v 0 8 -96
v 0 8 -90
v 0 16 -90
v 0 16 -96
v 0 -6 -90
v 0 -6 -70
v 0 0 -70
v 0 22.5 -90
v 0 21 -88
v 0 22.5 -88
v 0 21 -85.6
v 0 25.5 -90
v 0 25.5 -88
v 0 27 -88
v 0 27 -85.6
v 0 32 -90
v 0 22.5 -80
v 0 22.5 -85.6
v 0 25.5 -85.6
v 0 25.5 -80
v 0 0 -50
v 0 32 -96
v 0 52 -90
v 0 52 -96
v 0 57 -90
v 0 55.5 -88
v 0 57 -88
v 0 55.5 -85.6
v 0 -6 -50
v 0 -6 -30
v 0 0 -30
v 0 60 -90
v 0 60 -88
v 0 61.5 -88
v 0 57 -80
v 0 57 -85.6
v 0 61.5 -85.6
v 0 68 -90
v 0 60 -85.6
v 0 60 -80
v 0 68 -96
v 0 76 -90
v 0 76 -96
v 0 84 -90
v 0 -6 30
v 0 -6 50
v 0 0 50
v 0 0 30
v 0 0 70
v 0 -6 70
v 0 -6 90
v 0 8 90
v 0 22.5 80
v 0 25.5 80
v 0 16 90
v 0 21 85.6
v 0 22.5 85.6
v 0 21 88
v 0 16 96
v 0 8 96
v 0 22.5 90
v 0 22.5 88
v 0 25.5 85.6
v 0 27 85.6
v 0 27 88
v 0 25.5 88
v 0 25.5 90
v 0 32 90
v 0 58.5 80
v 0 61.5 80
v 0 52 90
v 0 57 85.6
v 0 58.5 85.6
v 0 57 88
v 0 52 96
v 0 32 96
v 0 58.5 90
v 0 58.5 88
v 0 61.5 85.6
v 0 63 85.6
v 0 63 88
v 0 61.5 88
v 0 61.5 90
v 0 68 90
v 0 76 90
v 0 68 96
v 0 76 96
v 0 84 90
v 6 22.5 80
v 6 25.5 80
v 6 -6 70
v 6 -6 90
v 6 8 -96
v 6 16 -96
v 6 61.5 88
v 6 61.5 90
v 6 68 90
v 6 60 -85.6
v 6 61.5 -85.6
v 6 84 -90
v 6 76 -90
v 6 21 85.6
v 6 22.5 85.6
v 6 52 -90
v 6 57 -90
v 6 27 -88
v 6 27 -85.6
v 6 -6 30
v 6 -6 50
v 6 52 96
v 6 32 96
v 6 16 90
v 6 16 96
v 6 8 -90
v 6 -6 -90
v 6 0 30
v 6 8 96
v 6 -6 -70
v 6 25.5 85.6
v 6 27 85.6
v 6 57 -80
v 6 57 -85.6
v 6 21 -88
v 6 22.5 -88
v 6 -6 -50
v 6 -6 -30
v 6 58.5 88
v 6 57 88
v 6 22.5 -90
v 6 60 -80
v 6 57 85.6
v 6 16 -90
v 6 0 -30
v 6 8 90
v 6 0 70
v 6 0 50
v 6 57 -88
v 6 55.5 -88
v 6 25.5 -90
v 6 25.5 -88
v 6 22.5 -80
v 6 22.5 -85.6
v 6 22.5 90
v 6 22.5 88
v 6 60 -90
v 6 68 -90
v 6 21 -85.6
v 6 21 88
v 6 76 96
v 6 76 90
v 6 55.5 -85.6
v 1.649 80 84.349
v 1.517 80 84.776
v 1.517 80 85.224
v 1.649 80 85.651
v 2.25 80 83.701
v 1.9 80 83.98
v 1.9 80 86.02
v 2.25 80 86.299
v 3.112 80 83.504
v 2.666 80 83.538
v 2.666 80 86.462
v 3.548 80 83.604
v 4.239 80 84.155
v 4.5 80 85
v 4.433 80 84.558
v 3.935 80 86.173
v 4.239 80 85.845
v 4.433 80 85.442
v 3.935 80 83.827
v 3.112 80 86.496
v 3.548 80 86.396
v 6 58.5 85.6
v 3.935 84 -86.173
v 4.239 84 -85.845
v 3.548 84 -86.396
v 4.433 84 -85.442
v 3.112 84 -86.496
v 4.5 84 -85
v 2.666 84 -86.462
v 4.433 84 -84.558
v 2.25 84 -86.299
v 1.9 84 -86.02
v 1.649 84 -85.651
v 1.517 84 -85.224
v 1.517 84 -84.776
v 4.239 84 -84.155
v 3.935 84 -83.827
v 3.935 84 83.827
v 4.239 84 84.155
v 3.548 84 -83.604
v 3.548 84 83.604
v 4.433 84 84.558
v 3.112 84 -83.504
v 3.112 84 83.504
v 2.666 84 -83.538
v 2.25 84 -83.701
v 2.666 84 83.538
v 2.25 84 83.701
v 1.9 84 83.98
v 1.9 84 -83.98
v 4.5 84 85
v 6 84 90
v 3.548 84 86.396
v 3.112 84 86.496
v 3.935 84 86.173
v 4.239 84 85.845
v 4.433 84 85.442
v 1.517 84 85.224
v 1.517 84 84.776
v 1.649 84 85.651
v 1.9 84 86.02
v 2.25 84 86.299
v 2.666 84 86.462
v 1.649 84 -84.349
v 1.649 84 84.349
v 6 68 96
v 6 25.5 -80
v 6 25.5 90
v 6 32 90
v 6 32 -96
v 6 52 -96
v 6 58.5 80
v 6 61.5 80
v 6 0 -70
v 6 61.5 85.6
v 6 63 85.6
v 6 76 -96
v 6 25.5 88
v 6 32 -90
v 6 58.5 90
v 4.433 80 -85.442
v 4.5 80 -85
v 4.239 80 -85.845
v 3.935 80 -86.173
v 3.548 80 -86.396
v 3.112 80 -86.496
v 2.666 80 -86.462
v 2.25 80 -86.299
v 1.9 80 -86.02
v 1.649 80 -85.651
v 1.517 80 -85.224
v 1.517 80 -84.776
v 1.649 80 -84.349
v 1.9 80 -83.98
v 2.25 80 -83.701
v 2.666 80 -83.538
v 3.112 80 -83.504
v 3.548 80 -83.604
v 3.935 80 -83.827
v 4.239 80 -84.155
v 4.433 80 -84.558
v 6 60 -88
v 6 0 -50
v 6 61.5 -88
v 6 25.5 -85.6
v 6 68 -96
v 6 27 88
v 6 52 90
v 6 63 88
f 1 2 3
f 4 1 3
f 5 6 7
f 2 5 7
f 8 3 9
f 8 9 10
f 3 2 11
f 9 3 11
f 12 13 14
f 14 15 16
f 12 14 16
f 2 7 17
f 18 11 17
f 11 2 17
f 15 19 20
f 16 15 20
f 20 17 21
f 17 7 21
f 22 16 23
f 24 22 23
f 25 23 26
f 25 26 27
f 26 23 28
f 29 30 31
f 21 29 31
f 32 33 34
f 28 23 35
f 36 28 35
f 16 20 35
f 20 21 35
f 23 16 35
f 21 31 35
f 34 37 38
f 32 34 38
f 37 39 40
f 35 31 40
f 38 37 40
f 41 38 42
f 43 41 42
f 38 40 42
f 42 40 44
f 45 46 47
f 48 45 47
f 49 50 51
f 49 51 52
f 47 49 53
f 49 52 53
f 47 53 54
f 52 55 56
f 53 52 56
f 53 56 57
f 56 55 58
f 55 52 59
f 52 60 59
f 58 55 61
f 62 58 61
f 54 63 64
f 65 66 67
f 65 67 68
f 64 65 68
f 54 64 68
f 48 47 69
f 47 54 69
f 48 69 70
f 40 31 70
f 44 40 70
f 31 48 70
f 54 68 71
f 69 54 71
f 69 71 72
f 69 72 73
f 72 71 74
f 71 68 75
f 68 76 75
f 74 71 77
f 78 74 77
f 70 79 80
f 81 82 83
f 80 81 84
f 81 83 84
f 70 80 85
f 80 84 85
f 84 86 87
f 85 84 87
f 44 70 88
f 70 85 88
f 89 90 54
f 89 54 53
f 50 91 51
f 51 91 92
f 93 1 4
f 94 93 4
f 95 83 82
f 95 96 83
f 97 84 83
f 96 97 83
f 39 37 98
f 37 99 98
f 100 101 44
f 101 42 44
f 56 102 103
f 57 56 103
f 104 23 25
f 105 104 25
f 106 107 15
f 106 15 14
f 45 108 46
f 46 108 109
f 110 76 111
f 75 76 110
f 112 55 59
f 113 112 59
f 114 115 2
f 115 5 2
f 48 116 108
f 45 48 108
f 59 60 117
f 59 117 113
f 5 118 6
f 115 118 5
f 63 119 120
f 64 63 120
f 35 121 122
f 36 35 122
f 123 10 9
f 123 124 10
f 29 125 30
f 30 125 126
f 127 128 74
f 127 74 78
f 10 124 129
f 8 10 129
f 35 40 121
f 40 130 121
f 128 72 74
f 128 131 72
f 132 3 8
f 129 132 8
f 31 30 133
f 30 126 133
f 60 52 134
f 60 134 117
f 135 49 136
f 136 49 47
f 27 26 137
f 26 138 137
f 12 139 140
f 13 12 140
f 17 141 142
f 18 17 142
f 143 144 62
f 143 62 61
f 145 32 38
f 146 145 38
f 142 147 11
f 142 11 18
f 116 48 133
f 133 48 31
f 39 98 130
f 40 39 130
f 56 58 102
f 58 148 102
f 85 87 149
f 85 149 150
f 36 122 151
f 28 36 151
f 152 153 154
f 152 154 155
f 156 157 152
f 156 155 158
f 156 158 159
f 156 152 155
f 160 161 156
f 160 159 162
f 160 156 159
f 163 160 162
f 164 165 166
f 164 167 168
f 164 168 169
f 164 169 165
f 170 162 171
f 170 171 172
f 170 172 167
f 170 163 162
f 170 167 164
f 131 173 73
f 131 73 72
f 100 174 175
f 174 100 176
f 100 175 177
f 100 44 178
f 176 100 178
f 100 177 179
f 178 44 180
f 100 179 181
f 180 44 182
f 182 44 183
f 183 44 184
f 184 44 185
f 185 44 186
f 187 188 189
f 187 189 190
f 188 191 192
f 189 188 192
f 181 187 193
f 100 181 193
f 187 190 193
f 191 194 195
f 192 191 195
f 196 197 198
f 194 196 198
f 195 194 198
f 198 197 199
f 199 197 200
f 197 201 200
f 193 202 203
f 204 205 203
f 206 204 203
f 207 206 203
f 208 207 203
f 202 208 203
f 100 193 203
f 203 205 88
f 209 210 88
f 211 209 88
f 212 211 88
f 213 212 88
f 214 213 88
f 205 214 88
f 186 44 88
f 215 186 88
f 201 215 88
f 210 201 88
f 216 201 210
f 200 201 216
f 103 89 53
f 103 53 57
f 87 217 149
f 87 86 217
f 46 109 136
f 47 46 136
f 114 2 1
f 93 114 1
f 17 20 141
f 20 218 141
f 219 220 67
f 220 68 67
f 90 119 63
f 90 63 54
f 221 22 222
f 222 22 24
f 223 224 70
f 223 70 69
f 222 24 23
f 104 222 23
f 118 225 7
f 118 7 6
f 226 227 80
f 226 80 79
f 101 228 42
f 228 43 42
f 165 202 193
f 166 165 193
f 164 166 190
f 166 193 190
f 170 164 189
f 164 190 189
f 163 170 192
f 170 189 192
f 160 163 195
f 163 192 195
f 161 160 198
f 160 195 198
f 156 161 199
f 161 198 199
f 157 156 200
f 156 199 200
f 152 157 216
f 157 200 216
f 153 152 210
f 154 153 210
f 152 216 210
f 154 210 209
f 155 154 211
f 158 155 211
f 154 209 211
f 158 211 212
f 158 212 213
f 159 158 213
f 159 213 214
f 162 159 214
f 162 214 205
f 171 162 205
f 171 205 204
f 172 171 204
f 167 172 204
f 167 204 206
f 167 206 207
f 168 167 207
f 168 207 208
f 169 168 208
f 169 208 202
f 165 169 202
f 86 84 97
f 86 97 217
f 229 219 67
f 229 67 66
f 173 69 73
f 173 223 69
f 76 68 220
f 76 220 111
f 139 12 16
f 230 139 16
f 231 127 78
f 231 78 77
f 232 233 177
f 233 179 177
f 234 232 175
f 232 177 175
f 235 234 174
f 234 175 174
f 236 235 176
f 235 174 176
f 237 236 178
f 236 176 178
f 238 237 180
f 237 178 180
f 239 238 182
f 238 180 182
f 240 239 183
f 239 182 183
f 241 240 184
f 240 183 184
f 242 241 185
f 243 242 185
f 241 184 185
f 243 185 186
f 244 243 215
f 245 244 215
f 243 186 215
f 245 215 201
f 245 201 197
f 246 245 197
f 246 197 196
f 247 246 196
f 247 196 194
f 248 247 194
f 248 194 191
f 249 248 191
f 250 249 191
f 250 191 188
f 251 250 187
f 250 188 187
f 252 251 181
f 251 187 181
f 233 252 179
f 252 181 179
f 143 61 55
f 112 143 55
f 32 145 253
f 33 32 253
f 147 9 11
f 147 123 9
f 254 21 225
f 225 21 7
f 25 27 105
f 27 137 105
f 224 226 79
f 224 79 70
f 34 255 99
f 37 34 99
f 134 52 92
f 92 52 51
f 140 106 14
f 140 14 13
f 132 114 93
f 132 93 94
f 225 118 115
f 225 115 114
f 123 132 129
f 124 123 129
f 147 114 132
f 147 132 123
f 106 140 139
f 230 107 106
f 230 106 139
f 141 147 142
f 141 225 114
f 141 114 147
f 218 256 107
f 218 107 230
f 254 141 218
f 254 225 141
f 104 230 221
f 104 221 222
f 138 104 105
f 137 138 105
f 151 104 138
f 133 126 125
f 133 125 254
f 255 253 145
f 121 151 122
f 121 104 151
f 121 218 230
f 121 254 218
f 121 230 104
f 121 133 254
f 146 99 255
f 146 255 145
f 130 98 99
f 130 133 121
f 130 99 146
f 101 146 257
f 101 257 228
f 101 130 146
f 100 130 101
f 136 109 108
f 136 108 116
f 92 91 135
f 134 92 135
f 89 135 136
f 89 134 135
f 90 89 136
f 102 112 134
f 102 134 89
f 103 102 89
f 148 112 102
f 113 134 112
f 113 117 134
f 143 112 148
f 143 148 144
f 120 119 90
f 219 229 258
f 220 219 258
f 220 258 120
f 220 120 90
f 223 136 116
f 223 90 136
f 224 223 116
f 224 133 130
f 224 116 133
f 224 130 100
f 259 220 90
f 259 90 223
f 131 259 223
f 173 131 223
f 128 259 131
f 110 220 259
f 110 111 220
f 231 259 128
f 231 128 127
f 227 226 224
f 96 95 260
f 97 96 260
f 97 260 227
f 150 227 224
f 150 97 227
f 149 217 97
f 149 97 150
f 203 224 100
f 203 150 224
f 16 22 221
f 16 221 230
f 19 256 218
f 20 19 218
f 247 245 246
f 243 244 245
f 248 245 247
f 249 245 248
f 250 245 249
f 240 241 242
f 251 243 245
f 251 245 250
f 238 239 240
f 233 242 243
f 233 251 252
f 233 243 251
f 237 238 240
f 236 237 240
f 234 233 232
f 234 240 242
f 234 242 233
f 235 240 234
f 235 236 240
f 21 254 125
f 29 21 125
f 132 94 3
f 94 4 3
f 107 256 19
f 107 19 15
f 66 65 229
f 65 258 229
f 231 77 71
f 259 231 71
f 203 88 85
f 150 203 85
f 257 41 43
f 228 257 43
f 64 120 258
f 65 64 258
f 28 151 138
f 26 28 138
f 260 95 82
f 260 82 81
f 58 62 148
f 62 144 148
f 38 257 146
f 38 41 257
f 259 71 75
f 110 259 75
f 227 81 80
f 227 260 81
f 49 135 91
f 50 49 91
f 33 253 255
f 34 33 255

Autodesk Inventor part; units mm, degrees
ref_plane "YZ Plane" through (0, 0, 0) normal (1, 0, 0) x (0, 1, 0)
ref_plane "XZ Plane" through (0, 0, 0) normal (0, 1, 0) x (-1, 0, 0)
ref_plane "XY Plane" through (0, 0, 0) normal (0, 0, 1) x (1, 0, 0)
sketch "Эскиз1" plane through (0, 0, 0) normal (1, 0, 0) x (0, 1, 0)
  line L0 (84, 90) -> (0, 90)
  line L1 (0, 90) -> (0, -90)
  line L2 (0, -90) -> (84, -90)
  line L3 (84, -90) -> (84, 90)
  line L4 (76, 90) -> (8, 90)
  line L5 (8, 90) -> (8, 96)
  line L6 (8, 96) -> (76, 96)
  line L7 (76, 96) -> (76, 90)
  line L8 (76, -90) -> (8, -90)
  line L9 (8, -90) -> (8, -96)
  line L10 (8, -96) -> (76, -96)
  line L11 (76, -96) -> (76, -90)
  line L12 (16, -96) -> (16, -90)
  line L13 (32, -96) -> (32, -90)
  line L14 (68, -96) -> (68, -90)
  line L15 (52, -96) -> (52, -90)
  line L16 (16, 90) -> (16, 96)
  line L17 (32, 90) -> (32, 96)
  line L18 (68, 90) -> (68, 96)
  line L19 (52, 90) -> (52, 96)
  circle A0 centre (20, -59.5) radius 1.5
  circle A1 centre (20, -73.5) radius 1.5
  circle A2 centre (7, -59.5) radius 1.5
  circle A3 centre (7, -73.5) radius 1.5
  line L20 (20, -59.5) -> (0, -59.5) construction
  line L21 (7, -59.5) -> (7, -73.5) construction
  line L22 (20, -73.5) -> (0, -73.5) construction
  point P0 (0, 0)
  point P1 (76, 93)
  point P2 (8, 93)
  point P3 (8, -90)
  point P4 (68, -93)
  point P5 (76, -93)
  point P6 (52, -93)
  point P7 (16, -93)
  point P8 (8, -93)
  point P9 (32, -93)
  point P10 (68, 93)
  point P11 (52, 93)
  point P12 (16, 93)
  point P13 (32, 93)
  dimension "d0" = 180
  dimension "d1" = 84
  dimension "d2" = 90
  dimension "d3" = 0
  dimension "d4" = 6
  dimension "d5" = 8
  dimension "d6" = 8
  dimension "d7" = 6
  dimension "d40" = 8
  dimension "d41" = 16
  dimension "d42" = 8
  dimension "d43" = 16
  dimension "d44" = 8
  dimension "d45" = 16
  dimension "d46" = 16
  dimension "d47" = 8
  dimension "d76" = 14
  dimension "d77" = 3
  dimension "d78" = 3
  dimension "d79" = 20
  dimension "d80" = 20
  dimension "d81" = 3
  dimension "d82" = 3
  dimension "d83" = 13
  dimension "d84" = 13
  dimension "d85" = 16.5
extrude "Выдавливание1" add sketch "Эскиз1" along normal blind 6 contours L3 L2 L1 L0 | L0 L18 L6 L7 | L11 L10 L14 L2 | L0 L17 L6 L19 | L15 L10 L13 L2 | L0 L5 L6 L16 | L12 L10 L9 L2 | A0 | A1 | A2 | A3
sketch "Эскиз4" plane through (0, 84, 90) normal (0, 1, 0) x (1, 0, 0)
  circle A0 centre (3, 5) radius 1.5
  circle A1 centre (3, 175) radius 1.5
  line L0 (0, 0) -> (6, 0)
  line L1 (6, 180) -> (6, 0)
  line L2 (0, 180) -> (6, 180)
  line L3 (6, 180) -> (6, 0) projected
  line L4 (0, 0) -> (6, 0) projected
  line L5 (0, 180) -> (6, 180) projected
  point P0 (0, 90)
  point P1 (3, 0)
  dimension "d30" = 3
  dimension "d31" = 3
  dimension "d32" = 5
  dimension "d33" = 3
  dimension "d34" = 5
  dimension "d35" = 3
  dimension "d36" = 6
  dimension "d37" = 6
extrude "Выдавливание4" cut sketch "Эскиз4" against normal blind 4
sketch "Эскиз6" plane through (6, 0, 0) normal (1, 0, 0) x (0, 0, -1)
  line L0 (-90, 8) -> (-90, 0) projected
  line L1 (-90, 0) -> (-70, 0)
  line L2 (-70, 0) -> (-70, -6)
  line L3 (-70, -6) -> (-90, -6)
  line L4 (-90, -6) -> (-90, 0)
  line L5 (-90, 0) -> (90, 0) projected
  line L6 (-50, 0) -> (-30, 0)
  line L7 (-30, 0) -> (-30, -6)
  line L8 (-30, -6) -> (-50, -6)
  line L9 (-50, -6) -> (-50, 0)
  line L10 (30, 0) -> (50, 0)
  line L11 (50, 0) -> (50, -6)
  line L12 (50, -6) -> (30, -6)
  line L13 (30, -6) -> (30, 0)
  line L14 (90, 0) -> (70, 0)
  line L15 (70, 0) -> (70, -6)
  line L16 (70, -6) -> (90, -6)
  line L17 (90, -6) -> (90, 0)
  point P0 (0, 0)
  point P1 (-80, -6)
  point P2 (-50, -3)
  point P3 (-70, -3)
  point P4 (-30, -3)
  point P5 (90, -3)
  point P6 (70, -3)
  point P7 (50, -3)
  dimension "d48" = 6
  dimension "d49" = 6
  dimension "d50" = 6
  dimension "d51" = 20
  dimension "d52" = 20
  dimension "d53" = 20
  dimension "d54" = 20
  dimension "d55" = 20
  dimension "d56" = 20
extrude "Выдавливание5" add sketch "Эскиз6" against normal blind 6
sketch "Эскиз8" plane through (6, 0, 0) normal (1, 0, 0) x (0, 0, -1)
  line L0 (90, 60) -> (80, 60)
  line L1 (80, 60) -> (80, 57)
  line L2 (80, 57) -> (90, 57)
  line L3 (90, 57) -> (90, 60)
  line L4 (85.6, 55.5) -> (88, 55.5)
  line L5 (88, 55.5) -> (88, 61.5)
  line L6 (88, 61.5) -> (85.6, 61.5)
  line L7 (85.6, 61.5) -> (85.6, 55.5)
  line L8 (90, 25.5) -> (80, 25.5)
  line L9 (80, 25.5) -> (80, 22.5)
  line L10 (80, 22.5) -> (90, 22.5)
  line L11 (90, 22.5) -> (90, 25.5)
  line L12 (85.6, 27) -> (88, 27)
  line L13 (88, 27) -> (88, 21)
  line L14 (88, 21) -> (85.6, 21)
  line L15 (85.6, 21) -> (85.6, 27)
  line L16 (-85.6, 27) -> (-88, 27)
  line L17 (-90, 22.5) -> (-90, 25.5)
  line L18 (-85.6, 21) -> (-85.6, 27)
  line L19 (-88, 21) -> (-85.6, 21)
  line L20 (-88, 27) -> (-88, 21)
  line L21 (-80, 61.5) -> (-80, 58.5)
  line L22 (-90, 61.5) -> (-80, 61.5)
  line L23 (-80, 25.5) -> (-80, 22.5)
  line L24 (-90, 25.5) -> (-80, 25.5)
  line L25 (-80, 22.5) -> (-90, 22.5)
  line L26 (-80, 58.5) -> (-90, 58.5)
  line L27 (-85.6, 57) -> (-88, 57)
  line L28 (-90, 58.5) -> (-90, 61.5)
  line L29 (-88, 57) -> (-88, 63)
  line L30 (-85.6, 63) -> (-85.6, 57)
  line L31 (-88, 63) -> (-85.6, 63)
  line L32 (90, 32) -> (96, 32) projected
  line L33 (90, 16) -> (90, 32) projected
  line L34 (90, 68) -> (96, 68) projected
  line L35 (-96, 68) -> (-90, 68) projected
  line L36 (-90, 68) -> (-90, 52) projected
  line L37 (-90, 32) -> (-90, 16) projected
  line L38 (-96, 32) -> (-90, 32) projected
  point P0 (0, 0)
  point P1 (97.0761, 73.2611)
  point P2 (97.0761, 37.2611)
  point P3 (-93, 32)
  point P4 (85.6, 22.5)
  point P5 (88, 22.5)
  point P6 (88, 25.5)
  point P7 (85.6, 25.5)
  point P8 (85.6, 57)
  point P9 (88, 57)
  point P10 (88, 60)
  point P11 (85.6, 60)
  point P12 (-88, 25.5)
  point P13 (-88, 22.5)
  point P14 (-85.6, 22.5)
  point P15 (-85.6, 25.5)
  point P16 (-85.6, 61.5)
  point P17 (-88, 61.5)
  point P18 (-88, 58.5)
  point P19 (-85.6, 58.5)
  dimension "d86" = 6
  dimension "d87" = 2.4
  dimension "d88" = 10
  dimension "d89" = 3
  dimension "d90" = 1.5
  dimension "d91" = 5.6
  dimension "d92" = 10
  dimension "d93" = 3
  dimension "d94" = 1.5
  dimension "d95" = 6
  dimension "d96" = 5.6
  dimension "d97" = 2.4
  dimension "d100" = 6.5
  dimension "d101" = 10
  dimension "d102" = 8
  dimension "d103" = 6.5
  dimension "d104" = 3
  dimension "d105" = 10
  dimension "d106" = 2.4
  dimension "d107" = 1.5
  dimension "d108" = 6
  dimension "d109" = 2
  dimension "d110" = 6
  dimension "d111" = 2.4
  dimension "d112" = 10
  dimension "d113" = 3
  dimension "d114" = 6.5
  dimension "d115" = 1.5
extrude "Выдавливание7" cut sketch "Эскиз8" against normal blind 10
equation "\"d2\" = 0.5 * d0"
equation "\"d42\" = d40"
equation "\"d43\" = d41"
equation "\"d44\" = d40"
equation "\"d45\" = d41"
equation "\"d46\" = d41"
equation "\"d47\" = d40"
equation "\"d52\" = d51"
equation "\"d53\" = d51"
equation "\"d54\" = d51"
equation "\"d55\" = d51"
equation "\"d56\" = d51"
properties part number "передняя стенка"
